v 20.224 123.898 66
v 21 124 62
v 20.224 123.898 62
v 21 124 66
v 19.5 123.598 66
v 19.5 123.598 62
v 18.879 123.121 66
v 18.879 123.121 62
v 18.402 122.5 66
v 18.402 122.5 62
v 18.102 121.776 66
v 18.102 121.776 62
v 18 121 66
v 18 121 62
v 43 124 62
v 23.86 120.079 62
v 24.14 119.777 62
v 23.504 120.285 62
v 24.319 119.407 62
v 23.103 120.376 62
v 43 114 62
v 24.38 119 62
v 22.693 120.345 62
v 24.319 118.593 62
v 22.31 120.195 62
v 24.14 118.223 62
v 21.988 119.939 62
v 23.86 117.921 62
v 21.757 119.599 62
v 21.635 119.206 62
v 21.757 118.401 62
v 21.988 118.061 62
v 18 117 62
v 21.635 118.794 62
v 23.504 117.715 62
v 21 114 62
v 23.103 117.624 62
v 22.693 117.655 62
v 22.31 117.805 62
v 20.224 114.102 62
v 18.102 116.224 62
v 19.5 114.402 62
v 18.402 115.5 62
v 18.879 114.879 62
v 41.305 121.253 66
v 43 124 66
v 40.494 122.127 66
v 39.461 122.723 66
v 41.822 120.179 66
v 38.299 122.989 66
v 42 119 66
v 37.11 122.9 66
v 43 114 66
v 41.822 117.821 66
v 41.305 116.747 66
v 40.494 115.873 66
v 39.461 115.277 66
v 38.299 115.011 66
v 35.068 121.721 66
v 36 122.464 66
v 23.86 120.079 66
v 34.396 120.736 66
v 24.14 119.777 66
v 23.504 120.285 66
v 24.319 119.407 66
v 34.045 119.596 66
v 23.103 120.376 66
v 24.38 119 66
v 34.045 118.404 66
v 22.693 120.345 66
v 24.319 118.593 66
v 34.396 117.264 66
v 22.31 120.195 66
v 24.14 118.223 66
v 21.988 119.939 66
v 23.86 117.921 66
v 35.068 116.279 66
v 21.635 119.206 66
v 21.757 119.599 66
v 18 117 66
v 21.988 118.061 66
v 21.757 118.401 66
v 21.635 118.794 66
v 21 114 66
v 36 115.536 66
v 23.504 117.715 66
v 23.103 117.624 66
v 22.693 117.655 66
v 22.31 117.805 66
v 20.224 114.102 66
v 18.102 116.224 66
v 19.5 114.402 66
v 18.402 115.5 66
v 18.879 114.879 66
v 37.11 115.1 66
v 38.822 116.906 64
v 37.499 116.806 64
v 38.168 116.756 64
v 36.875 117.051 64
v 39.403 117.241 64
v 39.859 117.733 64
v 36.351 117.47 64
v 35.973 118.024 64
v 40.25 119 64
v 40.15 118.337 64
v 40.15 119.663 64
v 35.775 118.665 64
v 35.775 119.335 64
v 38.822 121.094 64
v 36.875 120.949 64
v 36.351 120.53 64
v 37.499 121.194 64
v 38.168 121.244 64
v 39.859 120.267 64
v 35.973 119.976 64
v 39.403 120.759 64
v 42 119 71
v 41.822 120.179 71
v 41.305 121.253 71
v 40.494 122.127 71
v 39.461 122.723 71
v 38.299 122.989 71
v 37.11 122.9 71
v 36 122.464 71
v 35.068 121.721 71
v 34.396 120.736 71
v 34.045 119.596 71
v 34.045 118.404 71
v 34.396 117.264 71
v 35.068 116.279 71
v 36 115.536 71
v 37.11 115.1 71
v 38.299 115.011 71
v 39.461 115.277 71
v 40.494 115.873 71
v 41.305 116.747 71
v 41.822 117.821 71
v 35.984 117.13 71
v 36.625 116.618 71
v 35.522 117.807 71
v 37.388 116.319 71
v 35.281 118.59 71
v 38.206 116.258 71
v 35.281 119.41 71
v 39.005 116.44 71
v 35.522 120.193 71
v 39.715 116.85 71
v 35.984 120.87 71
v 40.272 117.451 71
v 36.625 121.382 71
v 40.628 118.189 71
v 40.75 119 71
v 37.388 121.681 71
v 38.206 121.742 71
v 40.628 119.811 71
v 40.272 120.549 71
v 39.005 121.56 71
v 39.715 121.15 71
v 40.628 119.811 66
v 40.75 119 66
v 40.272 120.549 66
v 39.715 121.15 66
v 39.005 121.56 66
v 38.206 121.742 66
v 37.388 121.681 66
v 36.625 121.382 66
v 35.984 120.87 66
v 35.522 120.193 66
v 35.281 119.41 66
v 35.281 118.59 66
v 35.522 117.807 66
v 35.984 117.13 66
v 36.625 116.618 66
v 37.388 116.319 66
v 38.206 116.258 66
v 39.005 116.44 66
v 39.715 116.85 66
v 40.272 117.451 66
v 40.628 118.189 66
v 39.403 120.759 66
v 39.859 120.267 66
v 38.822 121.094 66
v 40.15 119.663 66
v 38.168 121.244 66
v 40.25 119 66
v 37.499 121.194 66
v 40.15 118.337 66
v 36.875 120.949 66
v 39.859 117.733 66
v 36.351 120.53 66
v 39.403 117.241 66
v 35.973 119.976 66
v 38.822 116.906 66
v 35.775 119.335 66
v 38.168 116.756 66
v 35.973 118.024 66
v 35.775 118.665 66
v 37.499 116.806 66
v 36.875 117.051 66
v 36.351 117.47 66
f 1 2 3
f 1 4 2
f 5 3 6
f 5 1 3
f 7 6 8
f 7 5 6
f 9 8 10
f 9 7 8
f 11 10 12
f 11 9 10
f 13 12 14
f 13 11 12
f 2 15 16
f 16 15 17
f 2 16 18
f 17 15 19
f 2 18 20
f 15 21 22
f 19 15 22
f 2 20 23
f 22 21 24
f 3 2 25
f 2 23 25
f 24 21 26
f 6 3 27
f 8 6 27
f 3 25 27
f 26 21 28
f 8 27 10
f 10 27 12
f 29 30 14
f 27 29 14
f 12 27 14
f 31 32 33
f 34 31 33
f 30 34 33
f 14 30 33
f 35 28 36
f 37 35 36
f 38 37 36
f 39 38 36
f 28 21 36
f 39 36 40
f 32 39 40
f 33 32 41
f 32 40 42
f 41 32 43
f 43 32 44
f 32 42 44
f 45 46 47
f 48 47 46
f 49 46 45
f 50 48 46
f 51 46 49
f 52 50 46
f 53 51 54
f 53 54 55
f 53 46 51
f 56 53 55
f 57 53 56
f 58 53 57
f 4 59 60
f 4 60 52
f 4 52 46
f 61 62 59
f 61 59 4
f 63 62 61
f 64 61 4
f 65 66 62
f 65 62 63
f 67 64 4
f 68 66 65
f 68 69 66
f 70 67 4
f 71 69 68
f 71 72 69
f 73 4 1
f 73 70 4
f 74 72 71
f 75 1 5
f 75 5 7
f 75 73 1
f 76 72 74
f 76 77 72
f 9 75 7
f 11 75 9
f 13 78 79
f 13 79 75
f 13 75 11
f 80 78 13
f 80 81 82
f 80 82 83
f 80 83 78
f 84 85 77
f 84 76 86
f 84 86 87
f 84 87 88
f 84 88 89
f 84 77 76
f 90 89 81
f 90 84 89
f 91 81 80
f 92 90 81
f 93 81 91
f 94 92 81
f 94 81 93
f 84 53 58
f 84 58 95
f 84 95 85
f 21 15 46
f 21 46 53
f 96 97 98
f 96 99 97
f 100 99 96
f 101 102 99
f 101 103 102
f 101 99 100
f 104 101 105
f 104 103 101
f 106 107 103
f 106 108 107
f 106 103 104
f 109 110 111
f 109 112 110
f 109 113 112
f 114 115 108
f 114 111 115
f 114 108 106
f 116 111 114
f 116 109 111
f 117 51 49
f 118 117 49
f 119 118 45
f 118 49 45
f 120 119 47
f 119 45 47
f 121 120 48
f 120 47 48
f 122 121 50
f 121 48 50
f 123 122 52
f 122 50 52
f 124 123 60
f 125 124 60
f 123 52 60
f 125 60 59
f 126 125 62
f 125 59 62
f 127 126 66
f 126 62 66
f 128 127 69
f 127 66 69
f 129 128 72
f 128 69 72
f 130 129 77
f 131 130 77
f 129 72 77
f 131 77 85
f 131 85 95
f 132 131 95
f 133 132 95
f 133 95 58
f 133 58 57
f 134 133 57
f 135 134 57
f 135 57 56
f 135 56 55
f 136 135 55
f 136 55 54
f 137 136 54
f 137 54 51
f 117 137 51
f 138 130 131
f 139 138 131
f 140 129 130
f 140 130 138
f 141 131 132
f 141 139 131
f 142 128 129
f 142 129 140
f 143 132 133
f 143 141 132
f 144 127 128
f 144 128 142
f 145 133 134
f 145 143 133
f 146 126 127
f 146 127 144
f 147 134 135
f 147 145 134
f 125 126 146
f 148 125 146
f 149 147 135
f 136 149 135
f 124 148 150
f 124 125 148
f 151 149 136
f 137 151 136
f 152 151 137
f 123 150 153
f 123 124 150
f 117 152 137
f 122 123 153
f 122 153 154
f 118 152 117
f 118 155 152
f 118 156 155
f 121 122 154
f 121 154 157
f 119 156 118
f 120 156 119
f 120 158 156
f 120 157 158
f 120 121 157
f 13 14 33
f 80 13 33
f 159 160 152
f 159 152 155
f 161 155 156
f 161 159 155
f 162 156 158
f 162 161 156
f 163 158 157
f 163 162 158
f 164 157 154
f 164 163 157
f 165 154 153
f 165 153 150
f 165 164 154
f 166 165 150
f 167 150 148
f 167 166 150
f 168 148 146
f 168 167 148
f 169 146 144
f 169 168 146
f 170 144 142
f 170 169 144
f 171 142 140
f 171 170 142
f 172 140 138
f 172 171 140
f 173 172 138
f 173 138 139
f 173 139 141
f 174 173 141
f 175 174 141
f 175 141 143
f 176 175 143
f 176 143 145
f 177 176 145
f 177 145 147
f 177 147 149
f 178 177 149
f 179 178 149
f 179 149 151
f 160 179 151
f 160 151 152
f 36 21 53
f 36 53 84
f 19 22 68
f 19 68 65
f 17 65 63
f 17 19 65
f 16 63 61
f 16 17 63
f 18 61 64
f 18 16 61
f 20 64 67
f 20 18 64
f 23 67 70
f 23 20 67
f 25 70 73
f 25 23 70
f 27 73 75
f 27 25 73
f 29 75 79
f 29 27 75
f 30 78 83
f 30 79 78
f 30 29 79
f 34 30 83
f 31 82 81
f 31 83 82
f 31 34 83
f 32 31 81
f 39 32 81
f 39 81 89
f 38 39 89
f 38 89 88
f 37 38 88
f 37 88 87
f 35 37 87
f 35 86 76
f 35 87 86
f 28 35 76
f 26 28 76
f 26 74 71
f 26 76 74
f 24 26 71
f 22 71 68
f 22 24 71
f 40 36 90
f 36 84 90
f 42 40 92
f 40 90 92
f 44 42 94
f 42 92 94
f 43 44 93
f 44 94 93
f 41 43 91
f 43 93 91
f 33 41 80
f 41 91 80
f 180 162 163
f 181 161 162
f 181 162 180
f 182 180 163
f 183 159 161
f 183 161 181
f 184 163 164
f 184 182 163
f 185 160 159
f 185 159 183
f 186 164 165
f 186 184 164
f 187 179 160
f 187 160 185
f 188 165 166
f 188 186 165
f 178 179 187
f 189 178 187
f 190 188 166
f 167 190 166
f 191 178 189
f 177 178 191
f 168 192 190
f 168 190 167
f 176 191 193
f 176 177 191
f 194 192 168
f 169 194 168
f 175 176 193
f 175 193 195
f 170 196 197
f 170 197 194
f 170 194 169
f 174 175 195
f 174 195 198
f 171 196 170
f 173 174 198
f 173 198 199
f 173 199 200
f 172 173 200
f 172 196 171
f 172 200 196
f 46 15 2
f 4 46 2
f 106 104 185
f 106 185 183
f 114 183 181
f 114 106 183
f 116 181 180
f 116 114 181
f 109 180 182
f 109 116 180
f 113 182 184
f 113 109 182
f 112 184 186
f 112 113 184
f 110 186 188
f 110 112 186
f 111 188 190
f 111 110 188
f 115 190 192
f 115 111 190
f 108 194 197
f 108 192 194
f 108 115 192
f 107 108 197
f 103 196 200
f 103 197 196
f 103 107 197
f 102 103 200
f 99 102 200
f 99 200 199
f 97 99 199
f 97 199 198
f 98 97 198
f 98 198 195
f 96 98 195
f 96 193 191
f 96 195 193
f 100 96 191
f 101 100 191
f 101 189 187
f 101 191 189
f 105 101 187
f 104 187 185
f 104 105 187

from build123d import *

# Parameters (mm, degrees)
CYLINDER085_R     = 2.75
CYLINDER085_DEPTH = 7
CYLINDER084_R     = 4
CYLINDER084_DEPTH = 9
CYLINDER073_R     = 1.38
CYLINDER073_DEPTH = 10
CYLINDER074_R     = 2.25
CYLINDER074_DEPTH = 10
BOX041_W          = 25
BOX041_H          = 10
BOX041_DEPTH      = 4
FILLET008_R       = 3


with BuildPart() as cilindro004:
    # Cylinder085 → Cylinder085 (new body)
    with BuildSketch(Plane(origin=(17, 17, 12), x_dir=(1, 0, 0), z_dir=(0, 0, 1))):
        Circle(CYLINDER085_R)
    extrude(amount=CYLINDER085_DEPTH)


with BuildPart() as extensi_n_servo002:
    # Cylinder084 → Cylinder084 (new body)
    with BuildSketch(Plane(origin=(17, 17, 10), x_dir=(1, 0, 0), z_dir=(0, 0, 1))):
        Circle(CYLINDER084_R)
    extrude(amount=CYLINDER084_DEPTH)

    # Cut055: cut Cilindro004
    add(cilindro004.part, mode=Mode.SUBTRACT)


with BuildPart() as extensi_n_servo002_1:
    # Cut055 placement: moved
    add(extensi_n_servo002.part.moved(Location((21, 102, 52))))


with BuildPart() as cylinder073:
    # Cylinder073 → Cylinder073 (new body)
    with BuildSketch(Plane(origin=(25, 52, 59), x_dir=(1, 0, 0), z_dir=(0, 0, 1))):
        Circle(CYLINDER073_R)
    extrude(amount=CYLINDER073_DEPTH)


with BuildPart() as cylinder074:
    # Cylinder074 → Cylinder074 (new body)
    with BuildSketch(Plane(origin=(40, 52, 59), x_dir=(1, 0, 0), z_dir=(0, 0, 1))):
        Circle(CYLINDER074_R)
    extrude(amount=CYLINDER074_DEPTH)


with BuildPart() as palanca_3_final:
    # Box041 → Box041 (new body)
    with BuildSketch(Plane(origin=(45, 57, 62), x_dir=(-1, 0, 0), z_dir=(0, 0, 1))):
        with Locations((12.5, 5)):
            Rectangle(BOX041_W, BOX041_H)
    extrude(amount=BOX041_DEPTH)

    # Cut044: cut Cylinder074
    add(cylinder074.part, mode=Mode.SUBTRACT)

    # Cut045: cut Cylinder073
    add(cylinder073.part, mode=Mode.SUBTRACT)

    # Fillet008
    fillet008_edges = [palanca_3_final.edges().sort_by_distance(p)[0] for p in [
        (20, 57, 64),
        (20, 47, 64),
    ]]
    fillet(fillet008_edges, radius=FILLET008_R)


with BuildPart() as palanca_3_final_1:
    # Fillet008 placement: moved
    add(palanca_3_final.part.moved(Location((-2, 67, 0))))

    # Fusion011: union Extensión servo002
    add(extensi_n_servo002_1.part)


solid = palanca_3_final_1.part
